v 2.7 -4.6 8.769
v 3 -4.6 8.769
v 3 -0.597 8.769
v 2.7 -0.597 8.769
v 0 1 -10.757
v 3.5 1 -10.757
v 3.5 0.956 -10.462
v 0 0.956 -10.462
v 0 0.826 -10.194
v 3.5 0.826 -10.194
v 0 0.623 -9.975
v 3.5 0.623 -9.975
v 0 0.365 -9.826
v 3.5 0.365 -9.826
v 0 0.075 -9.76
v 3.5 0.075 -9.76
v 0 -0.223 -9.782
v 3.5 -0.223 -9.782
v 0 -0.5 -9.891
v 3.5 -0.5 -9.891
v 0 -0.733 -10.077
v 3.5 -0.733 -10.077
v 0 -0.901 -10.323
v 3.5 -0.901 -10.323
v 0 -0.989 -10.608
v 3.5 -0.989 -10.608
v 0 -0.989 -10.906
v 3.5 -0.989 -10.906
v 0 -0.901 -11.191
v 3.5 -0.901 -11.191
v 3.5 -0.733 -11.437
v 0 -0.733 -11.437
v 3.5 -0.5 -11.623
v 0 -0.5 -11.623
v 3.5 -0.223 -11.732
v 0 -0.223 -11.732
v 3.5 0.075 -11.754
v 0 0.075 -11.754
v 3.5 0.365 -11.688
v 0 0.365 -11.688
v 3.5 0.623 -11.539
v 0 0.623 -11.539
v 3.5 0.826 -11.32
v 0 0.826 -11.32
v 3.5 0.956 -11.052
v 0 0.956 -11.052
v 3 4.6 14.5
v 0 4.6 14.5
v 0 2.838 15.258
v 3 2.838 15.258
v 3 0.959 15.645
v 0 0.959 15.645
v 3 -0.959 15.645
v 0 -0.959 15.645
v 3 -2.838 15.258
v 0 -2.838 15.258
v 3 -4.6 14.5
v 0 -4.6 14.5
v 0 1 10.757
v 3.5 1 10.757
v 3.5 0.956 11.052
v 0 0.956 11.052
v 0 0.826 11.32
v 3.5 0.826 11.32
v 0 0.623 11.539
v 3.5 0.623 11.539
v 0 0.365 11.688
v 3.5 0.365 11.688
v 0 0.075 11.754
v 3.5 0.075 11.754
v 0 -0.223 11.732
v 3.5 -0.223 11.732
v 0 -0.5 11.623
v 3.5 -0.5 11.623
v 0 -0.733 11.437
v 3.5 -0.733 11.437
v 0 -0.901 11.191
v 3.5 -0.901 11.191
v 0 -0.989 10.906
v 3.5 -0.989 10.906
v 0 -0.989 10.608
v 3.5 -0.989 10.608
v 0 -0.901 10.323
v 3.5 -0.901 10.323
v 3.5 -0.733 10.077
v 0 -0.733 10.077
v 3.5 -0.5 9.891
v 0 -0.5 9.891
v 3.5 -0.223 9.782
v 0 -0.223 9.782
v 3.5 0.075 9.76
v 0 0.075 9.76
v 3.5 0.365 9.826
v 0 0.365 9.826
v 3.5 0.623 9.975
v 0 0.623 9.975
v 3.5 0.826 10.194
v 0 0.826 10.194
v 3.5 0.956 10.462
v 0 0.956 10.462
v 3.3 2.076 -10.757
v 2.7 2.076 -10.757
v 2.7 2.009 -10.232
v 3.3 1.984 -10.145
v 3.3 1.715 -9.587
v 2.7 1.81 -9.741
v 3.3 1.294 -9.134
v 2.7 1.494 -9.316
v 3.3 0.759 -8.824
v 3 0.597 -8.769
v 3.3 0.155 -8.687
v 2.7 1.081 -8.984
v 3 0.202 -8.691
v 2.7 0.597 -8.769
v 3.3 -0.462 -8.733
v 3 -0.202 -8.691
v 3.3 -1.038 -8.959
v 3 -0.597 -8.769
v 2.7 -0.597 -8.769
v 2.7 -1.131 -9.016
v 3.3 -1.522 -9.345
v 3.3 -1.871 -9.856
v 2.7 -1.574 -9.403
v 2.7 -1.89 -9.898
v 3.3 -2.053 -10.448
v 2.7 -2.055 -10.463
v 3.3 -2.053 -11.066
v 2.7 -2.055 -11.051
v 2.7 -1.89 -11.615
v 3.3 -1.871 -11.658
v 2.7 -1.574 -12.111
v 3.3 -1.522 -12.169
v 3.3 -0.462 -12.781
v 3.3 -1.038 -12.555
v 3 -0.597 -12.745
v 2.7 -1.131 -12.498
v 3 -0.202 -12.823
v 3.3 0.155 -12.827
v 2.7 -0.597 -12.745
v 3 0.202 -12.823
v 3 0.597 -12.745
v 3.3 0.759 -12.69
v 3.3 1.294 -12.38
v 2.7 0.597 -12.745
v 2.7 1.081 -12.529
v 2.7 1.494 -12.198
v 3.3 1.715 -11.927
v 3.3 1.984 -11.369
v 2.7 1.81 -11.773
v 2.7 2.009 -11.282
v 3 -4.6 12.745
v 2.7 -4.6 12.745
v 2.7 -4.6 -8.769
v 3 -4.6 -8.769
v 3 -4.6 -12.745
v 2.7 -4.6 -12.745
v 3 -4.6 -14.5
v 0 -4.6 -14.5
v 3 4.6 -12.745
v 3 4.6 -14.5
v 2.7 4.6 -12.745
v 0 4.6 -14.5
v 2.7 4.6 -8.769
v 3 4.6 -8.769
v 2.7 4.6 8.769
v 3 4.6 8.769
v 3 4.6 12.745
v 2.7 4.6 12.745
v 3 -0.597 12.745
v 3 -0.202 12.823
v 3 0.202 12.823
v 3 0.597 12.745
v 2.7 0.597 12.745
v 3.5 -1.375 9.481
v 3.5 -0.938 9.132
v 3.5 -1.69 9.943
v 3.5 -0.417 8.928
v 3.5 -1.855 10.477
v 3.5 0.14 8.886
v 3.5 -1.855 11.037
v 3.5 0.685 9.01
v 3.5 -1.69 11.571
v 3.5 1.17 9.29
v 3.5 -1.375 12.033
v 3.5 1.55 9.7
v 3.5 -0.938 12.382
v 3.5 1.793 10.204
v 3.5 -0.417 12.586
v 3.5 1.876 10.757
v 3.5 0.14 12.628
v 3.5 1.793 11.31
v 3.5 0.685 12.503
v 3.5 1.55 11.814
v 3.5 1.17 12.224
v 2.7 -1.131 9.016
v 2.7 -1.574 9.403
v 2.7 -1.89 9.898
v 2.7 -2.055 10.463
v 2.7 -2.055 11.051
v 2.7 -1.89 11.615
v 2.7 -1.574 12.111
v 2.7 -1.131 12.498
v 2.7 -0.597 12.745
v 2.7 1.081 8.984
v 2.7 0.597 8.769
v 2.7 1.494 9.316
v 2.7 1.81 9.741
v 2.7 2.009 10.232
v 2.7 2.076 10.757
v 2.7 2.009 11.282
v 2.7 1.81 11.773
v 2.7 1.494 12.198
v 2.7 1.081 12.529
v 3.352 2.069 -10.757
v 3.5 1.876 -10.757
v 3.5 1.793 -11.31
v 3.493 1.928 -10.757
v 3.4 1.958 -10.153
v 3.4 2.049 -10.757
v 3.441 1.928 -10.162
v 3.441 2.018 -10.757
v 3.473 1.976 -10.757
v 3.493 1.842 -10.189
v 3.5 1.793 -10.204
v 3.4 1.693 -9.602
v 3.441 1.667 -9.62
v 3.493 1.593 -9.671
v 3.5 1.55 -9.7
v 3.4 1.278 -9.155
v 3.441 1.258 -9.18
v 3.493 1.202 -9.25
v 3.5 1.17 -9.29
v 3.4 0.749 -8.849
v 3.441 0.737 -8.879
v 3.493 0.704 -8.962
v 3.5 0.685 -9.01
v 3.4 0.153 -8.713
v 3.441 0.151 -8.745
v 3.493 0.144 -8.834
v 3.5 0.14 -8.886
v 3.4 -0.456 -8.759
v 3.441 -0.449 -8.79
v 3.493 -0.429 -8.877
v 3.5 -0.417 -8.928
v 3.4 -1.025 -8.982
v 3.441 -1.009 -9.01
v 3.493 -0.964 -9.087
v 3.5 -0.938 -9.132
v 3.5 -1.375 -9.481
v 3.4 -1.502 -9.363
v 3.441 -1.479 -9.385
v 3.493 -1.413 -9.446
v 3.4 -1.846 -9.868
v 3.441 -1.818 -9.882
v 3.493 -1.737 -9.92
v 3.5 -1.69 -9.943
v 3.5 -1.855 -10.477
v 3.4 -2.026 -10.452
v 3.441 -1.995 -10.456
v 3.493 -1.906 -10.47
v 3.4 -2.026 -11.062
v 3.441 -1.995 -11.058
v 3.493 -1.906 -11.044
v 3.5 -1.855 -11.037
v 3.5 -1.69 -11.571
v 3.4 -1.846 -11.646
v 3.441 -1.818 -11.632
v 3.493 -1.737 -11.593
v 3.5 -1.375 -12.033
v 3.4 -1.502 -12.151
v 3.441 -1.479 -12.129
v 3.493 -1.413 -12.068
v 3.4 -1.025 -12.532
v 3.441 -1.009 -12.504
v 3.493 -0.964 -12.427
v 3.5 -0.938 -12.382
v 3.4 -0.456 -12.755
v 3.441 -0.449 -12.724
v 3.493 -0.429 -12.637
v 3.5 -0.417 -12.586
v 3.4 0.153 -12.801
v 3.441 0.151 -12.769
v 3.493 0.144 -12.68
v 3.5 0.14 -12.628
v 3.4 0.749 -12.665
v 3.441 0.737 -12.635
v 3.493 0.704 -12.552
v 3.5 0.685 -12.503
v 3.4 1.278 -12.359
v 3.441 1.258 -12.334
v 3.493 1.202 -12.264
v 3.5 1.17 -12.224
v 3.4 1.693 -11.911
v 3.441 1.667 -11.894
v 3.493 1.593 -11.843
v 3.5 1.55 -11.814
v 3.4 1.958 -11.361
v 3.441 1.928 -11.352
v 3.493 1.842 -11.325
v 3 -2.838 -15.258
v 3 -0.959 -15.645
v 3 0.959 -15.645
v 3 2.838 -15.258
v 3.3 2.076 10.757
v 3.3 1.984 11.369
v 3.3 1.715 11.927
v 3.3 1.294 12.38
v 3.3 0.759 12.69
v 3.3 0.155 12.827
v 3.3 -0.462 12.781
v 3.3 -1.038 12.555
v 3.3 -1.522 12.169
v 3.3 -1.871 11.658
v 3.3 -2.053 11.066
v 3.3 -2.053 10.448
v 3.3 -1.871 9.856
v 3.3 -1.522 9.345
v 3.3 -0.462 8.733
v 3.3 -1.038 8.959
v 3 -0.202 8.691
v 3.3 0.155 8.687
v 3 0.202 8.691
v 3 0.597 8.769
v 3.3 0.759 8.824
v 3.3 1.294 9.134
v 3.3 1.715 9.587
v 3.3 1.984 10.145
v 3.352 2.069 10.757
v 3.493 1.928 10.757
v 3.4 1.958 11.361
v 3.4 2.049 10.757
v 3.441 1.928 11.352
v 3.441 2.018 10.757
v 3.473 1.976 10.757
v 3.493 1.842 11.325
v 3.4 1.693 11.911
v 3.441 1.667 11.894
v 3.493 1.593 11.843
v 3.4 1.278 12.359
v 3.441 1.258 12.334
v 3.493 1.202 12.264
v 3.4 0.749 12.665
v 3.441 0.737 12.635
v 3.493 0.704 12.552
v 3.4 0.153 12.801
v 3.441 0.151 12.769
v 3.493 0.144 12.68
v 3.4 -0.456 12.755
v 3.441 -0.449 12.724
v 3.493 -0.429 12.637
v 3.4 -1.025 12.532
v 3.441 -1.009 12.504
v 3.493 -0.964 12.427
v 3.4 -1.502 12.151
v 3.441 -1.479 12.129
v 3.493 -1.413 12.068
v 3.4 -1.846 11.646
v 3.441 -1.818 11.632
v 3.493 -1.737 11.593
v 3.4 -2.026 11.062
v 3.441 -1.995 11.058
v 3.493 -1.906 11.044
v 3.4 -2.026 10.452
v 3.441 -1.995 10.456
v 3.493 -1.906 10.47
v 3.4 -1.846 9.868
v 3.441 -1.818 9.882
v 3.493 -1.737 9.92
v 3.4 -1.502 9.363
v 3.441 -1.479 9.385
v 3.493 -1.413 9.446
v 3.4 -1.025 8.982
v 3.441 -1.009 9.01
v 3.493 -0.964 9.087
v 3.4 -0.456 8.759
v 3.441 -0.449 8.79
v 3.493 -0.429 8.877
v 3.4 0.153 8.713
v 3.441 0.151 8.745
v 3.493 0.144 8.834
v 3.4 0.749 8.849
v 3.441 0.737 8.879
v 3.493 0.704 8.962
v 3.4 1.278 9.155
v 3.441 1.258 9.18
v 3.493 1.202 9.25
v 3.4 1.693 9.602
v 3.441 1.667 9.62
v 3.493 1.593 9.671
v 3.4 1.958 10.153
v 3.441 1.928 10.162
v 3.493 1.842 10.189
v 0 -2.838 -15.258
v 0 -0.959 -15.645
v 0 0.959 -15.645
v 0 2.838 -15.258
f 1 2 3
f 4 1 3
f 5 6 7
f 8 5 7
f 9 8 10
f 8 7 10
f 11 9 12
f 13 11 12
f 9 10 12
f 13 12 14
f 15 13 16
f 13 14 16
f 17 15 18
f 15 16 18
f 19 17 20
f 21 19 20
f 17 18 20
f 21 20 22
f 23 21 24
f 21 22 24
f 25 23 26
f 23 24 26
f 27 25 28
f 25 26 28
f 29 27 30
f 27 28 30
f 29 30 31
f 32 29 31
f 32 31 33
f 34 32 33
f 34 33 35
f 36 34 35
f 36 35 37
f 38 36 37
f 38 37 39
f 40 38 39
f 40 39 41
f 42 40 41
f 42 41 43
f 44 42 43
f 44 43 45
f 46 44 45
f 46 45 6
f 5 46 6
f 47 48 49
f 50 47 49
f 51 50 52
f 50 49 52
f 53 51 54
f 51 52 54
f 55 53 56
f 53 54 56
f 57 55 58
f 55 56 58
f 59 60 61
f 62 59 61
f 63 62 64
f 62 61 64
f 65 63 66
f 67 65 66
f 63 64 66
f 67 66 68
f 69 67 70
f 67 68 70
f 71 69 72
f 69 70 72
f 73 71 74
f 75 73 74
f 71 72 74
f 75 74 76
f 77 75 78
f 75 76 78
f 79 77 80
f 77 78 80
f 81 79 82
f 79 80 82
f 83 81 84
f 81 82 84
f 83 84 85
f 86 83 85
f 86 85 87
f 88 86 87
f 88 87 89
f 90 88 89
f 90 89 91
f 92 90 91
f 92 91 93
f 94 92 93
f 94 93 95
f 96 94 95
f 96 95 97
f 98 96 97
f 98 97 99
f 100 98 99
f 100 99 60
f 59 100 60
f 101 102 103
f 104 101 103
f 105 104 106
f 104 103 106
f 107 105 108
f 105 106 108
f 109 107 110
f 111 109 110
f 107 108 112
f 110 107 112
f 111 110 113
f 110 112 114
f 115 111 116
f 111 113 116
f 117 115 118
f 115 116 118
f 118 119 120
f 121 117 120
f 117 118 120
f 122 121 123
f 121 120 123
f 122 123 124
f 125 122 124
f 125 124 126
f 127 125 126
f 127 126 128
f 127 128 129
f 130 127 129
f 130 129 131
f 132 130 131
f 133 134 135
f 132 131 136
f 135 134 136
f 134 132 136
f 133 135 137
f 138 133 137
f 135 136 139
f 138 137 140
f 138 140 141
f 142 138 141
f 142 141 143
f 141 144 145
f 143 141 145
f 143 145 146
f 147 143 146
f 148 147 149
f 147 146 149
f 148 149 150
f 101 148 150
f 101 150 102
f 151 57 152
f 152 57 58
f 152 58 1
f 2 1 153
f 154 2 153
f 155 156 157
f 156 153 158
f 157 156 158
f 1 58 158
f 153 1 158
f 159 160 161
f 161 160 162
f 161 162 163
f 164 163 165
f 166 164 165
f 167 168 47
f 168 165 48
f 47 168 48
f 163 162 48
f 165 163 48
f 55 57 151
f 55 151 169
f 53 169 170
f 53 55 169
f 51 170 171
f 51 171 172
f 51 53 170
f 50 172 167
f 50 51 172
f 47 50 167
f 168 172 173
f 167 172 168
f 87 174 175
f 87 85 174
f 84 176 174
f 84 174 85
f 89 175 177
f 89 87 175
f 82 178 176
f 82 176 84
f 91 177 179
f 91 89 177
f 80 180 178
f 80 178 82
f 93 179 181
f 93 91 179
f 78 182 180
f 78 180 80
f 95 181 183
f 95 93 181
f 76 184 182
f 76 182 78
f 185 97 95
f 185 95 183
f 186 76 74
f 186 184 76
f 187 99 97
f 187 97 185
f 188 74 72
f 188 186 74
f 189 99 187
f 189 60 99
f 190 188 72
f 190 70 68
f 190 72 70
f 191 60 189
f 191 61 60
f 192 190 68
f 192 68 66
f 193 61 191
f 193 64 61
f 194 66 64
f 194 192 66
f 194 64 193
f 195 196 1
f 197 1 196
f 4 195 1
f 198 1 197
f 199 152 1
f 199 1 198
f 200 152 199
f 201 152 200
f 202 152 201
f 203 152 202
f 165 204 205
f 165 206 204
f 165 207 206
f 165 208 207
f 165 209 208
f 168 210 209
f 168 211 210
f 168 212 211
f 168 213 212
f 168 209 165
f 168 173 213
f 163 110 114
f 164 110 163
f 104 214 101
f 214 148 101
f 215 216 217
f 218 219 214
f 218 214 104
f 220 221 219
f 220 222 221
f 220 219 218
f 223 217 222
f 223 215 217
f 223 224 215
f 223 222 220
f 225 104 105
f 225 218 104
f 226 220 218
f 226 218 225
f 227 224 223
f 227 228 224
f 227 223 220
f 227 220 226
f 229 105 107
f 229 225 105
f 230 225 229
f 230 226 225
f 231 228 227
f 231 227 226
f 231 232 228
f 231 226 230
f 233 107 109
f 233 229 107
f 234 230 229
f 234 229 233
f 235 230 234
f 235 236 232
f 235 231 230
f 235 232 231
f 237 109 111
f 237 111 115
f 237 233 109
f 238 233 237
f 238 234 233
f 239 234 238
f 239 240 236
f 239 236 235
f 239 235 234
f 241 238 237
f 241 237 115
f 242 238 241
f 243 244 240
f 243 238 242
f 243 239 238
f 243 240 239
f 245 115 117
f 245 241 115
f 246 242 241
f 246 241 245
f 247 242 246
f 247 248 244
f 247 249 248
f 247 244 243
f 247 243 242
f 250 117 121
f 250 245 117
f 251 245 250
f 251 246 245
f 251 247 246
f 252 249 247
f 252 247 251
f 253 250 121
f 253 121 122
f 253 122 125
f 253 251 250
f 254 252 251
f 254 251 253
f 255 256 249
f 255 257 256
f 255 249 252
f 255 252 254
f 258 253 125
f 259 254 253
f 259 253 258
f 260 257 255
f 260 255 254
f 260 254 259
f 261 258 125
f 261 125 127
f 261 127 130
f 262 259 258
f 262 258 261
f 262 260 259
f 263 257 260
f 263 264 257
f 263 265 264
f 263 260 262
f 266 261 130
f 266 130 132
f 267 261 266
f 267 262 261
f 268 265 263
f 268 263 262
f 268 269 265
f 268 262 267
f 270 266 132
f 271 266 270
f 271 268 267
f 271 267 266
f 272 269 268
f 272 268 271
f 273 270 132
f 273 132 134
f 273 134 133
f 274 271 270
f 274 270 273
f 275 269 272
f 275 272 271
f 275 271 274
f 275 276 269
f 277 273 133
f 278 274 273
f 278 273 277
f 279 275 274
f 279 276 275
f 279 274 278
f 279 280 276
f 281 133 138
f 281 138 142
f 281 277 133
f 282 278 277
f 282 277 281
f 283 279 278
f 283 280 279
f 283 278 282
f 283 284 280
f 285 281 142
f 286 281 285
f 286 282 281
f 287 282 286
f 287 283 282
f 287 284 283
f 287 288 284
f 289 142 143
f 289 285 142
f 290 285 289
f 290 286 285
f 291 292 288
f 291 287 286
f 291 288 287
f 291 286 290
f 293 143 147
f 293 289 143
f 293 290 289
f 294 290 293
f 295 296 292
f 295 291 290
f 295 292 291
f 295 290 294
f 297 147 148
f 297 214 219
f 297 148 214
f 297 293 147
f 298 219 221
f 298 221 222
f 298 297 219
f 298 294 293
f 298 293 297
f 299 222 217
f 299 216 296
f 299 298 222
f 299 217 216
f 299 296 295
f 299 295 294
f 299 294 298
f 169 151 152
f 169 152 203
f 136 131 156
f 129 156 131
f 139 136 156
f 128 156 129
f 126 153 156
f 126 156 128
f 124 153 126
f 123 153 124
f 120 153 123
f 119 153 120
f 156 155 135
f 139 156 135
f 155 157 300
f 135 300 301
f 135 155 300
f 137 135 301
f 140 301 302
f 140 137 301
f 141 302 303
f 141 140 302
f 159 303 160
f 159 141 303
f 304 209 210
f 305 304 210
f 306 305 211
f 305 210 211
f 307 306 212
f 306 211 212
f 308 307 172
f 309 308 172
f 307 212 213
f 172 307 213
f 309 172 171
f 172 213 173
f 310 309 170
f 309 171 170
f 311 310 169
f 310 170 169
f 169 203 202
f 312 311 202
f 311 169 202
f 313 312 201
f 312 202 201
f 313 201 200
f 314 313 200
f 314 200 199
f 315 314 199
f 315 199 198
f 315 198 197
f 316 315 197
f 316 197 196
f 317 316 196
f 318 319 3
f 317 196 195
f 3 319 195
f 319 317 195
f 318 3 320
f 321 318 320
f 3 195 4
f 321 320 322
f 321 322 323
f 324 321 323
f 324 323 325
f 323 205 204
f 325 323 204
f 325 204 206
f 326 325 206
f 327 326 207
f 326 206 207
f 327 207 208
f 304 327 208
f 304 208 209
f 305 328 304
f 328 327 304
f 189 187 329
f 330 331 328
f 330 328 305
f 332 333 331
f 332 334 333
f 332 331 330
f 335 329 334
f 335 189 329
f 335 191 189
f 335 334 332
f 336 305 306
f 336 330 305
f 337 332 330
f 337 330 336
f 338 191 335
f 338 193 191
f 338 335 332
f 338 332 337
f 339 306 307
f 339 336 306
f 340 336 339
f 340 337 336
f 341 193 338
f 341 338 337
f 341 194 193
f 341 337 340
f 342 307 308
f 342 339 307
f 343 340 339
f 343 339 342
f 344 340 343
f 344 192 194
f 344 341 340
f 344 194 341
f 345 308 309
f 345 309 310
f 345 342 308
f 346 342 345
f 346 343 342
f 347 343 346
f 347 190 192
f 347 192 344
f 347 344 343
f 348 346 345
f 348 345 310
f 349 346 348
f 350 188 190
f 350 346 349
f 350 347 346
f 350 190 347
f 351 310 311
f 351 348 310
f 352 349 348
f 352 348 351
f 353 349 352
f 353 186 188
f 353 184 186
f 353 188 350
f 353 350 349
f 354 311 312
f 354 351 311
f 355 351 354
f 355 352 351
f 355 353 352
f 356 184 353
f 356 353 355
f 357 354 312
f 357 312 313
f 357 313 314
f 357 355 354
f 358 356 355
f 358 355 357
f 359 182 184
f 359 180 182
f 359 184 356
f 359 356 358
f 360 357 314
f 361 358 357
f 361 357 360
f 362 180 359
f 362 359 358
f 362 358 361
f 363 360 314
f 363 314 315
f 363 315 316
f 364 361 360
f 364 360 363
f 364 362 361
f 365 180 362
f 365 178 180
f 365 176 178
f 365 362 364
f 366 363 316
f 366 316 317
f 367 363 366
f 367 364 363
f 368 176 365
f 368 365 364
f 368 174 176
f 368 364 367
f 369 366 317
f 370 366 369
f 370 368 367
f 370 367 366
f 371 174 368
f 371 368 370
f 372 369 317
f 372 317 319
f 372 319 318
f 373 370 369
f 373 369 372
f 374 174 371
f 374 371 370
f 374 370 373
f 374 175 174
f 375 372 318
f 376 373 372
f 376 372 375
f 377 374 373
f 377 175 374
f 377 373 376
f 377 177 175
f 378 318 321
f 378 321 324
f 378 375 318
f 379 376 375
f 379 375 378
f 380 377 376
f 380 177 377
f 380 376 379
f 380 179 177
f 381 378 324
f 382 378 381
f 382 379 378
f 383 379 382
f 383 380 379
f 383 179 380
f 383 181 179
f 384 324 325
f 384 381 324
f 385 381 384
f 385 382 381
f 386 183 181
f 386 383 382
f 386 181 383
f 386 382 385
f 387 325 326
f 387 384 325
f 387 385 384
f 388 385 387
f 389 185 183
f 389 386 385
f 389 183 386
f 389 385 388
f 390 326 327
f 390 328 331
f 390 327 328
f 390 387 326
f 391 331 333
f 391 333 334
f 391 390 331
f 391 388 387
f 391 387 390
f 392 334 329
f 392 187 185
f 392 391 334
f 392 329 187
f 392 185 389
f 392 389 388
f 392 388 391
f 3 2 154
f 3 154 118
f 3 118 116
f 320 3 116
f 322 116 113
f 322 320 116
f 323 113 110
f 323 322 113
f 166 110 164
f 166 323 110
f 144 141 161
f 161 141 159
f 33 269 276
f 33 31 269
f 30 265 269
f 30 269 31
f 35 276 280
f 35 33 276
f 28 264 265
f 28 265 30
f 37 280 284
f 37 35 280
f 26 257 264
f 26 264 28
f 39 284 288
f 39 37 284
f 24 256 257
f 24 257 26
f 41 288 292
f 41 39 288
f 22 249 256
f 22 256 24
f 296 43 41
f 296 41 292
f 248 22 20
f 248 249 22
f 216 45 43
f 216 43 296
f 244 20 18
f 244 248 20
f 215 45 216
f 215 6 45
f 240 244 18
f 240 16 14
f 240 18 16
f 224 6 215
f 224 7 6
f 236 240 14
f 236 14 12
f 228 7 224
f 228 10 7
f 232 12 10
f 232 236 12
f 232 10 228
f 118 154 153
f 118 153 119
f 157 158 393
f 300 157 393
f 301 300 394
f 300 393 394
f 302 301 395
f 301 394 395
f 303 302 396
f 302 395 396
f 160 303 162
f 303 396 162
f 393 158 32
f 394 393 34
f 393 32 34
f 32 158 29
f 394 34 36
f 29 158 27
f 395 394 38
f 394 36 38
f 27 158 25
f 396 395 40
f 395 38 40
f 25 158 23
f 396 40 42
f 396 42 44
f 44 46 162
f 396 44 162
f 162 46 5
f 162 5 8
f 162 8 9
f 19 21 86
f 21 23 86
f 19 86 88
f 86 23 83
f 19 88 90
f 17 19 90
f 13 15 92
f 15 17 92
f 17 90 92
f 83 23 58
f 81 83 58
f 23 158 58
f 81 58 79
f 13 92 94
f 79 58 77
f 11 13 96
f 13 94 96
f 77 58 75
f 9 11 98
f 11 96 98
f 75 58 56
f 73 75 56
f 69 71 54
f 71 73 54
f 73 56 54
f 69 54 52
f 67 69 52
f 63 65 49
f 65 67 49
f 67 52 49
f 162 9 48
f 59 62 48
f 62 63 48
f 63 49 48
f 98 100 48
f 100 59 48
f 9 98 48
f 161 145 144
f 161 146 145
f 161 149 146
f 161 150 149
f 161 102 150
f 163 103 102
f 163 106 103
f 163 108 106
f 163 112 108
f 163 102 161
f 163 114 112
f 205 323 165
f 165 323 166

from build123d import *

# Parameters (mm, degrees)
F1_DEPTH = 3
F2_W     = 9.2
F2_H     = 3.976691
F3_DEPTH = 0.3
F4_R     = 2.07618
F5_DEPTH = 0.8
F6_R     = 0.2
F7_R     = 1
F8_DEPTH = 25


with BuildPart() as f1:
    # F0 (on Right) → F1 (new body)
    with BuildSketch(Plane.YZ):
        with BuildLine():
            Line((4.6, -14.5), (4.6, 14.5))
            ThreePointArc((4.6, 14.5), (0, 15.694247), (-4.6, 14.5))
            Line((-4.6, 14.5), (-4.6, -14.5))
            ThreePointArc((-4.6, -14.5), (0, -15.694247), (4.6, -14.5))
        make_face()
    extrude(amount=F1_DEPTH)

    # F2 (on face) → F3 (cut)
    with BuildSketch(Plane.YZ.offset(3)):
        with Locations((0, 10.756953)):
            Rectangle(F2_W, F2_H)
        with Locations((0, -10.756953)):
            Rectangle(F2_W, F2_H)
    extrude(amount=-F3_DEPTH, mode=Mode.SUBTRACT)

    # F4 (on face) → F5 (join)
    with BuildSketch(Plane.YZ.offset(2.7)):
        with Locations((0, 10.756953)):
            Circle(F4_R)
        with Locations((0, -10.756953)):
            Circle(F4_R)
    extrude(amount=F5_DEPTH)

    # F6
    f6_edges = [f1.edges().sort_by_distance(p)[0] for p in [
        (3.5, -2.07618, 10.756953),
        (3.5, -2.07618, -10.756953),
    ]]
    fillet(f6_edges, radius=F6_R)

    # F7 (on face) → F8 (cut)
    with BuildSketch(Plane.YZ.offset(3.5)):
        with Locations((0, 10.756953)):
            Circle(F7_R)
        with Locations((0, -10.756953)):
            Circle(F7_R)
    extrude(amount=-F8_DEPTH, mode=Mode.SUBTRACT)


solid = f1.part
